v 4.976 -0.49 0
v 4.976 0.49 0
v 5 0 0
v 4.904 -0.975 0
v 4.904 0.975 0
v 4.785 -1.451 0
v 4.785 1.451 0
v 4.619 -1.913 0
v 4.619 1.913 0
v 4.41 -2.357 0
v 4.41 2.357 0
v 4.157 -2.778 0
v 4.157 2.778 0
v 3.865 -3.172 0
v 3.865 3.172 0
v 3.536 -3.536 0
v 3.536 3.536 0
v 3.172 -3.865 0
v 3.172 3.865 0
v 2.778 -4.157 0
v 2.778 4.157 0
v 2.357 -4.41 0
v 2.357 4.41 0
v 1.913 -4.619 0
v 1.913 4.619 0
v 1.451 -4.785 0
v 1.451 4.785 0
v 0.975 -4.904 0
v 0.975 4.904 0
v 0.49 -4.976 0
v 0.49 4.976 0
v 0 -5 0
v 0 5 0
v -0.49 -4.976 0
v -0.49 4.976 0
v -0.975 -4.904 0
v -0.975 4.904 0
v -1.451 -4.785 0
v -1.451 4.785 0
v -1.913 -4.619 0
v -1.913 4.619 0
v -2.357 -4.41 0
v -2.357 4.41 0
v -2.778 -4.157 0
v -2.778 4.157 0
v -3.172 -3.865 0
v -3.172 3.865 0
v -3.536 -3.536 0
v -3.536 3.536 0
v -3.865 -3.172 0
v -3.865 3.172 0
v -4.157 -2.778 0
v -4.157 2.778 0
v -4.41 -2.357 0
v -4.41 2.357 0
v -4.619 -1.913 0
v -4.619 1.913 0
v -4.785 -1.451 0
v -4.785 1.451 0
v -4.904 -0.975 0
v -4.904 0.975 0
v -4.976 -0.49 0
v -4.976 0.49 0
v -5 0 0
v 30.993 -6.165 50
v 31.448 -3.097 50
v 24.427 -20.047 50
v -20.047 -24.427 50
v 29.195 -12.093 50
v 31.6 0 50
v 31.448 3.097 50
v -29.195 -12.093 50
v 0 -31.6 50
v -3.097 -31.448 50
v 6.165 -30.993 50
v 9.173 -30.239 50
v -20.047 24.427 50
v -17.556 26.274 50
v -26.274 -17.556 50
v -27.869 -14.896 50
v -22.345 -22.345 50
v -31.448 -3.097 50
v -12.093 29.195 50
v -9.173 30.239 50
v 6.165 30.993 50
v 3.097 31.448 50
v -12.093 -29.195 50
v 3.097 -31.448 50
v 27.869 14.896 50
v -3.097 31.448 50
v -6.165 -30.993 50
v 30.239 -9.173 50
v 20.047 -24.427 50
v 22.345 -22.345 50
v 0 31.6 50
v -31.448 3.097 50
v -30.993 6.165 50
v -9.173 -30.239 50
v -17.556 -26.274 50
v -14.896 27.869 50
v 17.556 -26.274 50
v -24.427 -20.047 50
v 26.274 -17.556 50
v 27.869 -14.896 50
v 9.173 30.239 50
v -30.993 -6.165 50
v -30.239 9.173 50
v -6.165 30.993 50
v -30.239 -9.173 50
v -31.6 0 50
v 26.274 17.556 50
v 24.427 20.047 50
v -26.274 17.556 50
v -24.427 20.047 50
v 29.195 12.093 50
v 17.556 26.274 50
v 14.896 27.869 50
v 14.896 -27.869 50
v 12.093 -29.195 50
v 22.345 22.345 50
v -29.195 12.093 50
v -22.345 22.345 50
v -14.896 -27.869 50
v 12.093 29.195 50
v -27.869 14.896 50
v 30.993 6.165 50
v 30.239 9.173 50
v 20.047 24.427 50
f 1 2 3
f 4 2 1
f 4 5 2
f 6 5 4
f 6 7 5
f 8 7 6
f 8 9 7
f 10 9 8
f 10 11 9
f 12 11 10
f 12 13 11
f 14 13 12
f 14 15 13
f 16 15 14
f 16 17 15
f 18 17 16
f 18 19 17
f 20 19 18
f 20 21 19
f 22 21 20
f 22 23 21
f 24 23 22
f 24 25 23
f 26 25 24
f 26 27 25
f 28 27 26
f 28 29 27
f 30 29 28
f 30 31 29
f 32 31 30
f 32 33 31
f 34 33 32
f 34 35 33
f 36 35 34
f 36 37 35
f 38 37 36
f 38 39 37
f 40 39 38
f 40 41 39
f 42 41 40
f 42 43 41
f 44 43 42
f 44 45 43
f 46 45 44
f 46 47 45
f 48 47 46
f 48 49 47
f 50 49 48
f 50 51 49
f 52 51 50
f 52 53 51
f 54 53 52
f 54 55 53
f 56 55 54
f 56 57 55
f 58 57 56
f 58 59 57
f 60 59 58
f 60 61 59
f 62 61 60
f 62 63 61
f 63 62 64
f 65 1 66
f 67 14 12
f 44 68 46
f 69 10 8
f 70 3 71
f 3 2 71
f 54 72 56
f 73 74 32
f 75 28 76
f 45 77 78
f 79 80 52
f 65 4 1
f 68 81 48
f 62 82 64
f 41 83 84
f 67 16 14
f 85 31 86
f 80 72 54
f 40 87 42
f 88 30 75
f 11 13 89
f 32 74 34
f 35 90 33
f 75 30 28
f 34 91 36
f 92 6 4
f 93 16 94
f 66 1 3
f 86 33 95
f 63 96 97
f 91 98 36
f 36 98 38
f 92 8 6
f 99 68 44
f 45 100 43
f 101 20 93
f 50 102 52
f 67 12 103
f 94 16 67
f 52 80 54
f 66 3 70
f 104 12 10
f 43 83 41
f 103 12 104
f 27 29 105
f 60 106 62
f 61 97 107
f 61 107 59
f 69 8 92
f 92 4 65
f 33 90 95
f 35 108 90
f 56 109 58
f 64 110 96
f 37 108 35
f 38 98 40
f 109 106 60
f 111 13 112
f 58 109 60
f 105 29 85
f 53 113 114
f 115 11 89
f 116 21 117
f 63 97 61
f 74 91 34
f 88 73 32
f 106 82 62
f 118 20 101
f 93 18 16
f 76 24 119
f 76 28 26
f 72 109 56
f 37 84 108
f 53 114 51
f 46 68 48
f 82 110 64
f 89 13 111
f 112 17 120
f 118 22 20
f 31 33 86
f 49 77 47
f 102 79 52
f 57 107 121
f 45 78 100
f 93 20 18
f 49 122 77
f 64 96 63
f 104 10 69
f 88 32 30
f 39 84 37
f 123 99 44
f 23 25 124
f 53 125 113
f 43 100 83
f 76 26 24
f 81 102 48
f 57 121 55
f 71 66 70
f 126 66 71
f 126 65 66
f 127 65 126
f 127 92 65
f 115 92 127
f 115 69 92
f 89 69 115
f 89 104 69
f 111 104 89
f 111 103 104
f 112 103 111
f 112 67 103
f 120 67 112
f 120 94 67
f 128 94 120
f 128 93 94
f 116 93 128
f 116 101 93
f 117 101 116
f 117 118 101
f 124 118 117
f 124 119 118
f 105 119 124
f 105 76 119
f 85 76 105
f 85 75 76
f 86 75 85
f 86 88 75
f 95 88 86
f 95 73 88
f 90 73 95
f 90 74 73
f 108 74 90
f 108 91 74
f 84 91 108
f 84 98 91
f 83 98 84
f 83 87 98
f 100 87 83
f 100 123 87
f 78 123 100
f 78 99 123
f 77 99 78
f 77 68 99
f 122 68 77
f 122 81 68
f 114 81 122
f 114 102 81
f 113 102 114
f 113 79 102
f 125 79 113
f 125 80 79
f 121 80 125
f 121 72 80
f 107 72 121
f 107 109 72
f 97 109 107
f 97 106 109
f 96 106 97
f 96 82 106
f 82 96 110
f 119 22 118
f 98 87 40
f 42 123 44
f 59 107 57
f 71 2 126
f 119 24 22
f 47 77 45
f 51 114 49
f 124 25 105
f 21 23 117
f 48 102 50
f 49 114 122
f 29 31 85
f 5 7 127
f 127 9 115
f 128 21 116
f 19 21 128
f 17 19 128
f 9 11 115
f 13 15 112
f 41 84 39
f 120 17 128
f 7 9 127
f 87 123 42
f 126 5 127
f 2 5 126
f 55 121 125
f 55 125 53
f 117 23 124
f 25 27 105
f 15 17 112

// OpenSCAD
// Lab Funnel Design
// Units: mm

// Dimensions
funnel_wall_thickness = 1.6;
funnel_spout_od = 10;
funnel_spout_length = 20;
funnel_cone_od_top = 60;
funnel_cone_height = 50;
funnel_cone_od_bottom = funnel_spout_od;

// Derived Dimensions
funnel_spout_id = funnel_spout_od - (2 * funnel_wall_thickness);
funnel_cone_id_top = funnel_cone_od_top - (2 * funnel_wall_thickness);
funnel_cone_id_bottom = funnel_cone_od_bottom - (2 * funnel_wall_thickness);

// Render
$fn = 64;

// Main Body
union() {
    // Spout (Straight Tube)
    cylinder(
        h = funnel_spout_length, 
        r1 = funnel_spout_od / 2, 
        r2 = funnel_spout_od / 2
    );
    
    // Cone (Tapered Section)
    // We calculate the radius at the bottom of the cone to create a smooth transition
    // The cone starts at z=20 (radius 5) and ends at z=50 (radius 30)
    cone_radius_bottom = funnel_spout_od / 2;
    cone_radius_top = (funnel_cone_od_top / 2) + funnel_wall_thickness;
    
    cylinder(
        h = funnel_cone_height, 
        r1 = cone_radius_bottom, 
        r2 = cone_radius_top
    );
}

// Inner Cut (Void)
// The cut extends slightly past the top face to ensure the rim is fully open
difference() {
    // Outer shape (already defined in union)
    
    // Spout Bore
    cylinder(
        h = funnel_spout_length + 0.1, 
        r = funnel_spout_id / 2
    );
    
    // Cone Bore
    cylinder(
        h = funnel_cone_height + 0.1, 
        r1 = funnel_cone_id_bottom / 2, 
        r2 = funnel_cone_id_top / 2
    );
}
